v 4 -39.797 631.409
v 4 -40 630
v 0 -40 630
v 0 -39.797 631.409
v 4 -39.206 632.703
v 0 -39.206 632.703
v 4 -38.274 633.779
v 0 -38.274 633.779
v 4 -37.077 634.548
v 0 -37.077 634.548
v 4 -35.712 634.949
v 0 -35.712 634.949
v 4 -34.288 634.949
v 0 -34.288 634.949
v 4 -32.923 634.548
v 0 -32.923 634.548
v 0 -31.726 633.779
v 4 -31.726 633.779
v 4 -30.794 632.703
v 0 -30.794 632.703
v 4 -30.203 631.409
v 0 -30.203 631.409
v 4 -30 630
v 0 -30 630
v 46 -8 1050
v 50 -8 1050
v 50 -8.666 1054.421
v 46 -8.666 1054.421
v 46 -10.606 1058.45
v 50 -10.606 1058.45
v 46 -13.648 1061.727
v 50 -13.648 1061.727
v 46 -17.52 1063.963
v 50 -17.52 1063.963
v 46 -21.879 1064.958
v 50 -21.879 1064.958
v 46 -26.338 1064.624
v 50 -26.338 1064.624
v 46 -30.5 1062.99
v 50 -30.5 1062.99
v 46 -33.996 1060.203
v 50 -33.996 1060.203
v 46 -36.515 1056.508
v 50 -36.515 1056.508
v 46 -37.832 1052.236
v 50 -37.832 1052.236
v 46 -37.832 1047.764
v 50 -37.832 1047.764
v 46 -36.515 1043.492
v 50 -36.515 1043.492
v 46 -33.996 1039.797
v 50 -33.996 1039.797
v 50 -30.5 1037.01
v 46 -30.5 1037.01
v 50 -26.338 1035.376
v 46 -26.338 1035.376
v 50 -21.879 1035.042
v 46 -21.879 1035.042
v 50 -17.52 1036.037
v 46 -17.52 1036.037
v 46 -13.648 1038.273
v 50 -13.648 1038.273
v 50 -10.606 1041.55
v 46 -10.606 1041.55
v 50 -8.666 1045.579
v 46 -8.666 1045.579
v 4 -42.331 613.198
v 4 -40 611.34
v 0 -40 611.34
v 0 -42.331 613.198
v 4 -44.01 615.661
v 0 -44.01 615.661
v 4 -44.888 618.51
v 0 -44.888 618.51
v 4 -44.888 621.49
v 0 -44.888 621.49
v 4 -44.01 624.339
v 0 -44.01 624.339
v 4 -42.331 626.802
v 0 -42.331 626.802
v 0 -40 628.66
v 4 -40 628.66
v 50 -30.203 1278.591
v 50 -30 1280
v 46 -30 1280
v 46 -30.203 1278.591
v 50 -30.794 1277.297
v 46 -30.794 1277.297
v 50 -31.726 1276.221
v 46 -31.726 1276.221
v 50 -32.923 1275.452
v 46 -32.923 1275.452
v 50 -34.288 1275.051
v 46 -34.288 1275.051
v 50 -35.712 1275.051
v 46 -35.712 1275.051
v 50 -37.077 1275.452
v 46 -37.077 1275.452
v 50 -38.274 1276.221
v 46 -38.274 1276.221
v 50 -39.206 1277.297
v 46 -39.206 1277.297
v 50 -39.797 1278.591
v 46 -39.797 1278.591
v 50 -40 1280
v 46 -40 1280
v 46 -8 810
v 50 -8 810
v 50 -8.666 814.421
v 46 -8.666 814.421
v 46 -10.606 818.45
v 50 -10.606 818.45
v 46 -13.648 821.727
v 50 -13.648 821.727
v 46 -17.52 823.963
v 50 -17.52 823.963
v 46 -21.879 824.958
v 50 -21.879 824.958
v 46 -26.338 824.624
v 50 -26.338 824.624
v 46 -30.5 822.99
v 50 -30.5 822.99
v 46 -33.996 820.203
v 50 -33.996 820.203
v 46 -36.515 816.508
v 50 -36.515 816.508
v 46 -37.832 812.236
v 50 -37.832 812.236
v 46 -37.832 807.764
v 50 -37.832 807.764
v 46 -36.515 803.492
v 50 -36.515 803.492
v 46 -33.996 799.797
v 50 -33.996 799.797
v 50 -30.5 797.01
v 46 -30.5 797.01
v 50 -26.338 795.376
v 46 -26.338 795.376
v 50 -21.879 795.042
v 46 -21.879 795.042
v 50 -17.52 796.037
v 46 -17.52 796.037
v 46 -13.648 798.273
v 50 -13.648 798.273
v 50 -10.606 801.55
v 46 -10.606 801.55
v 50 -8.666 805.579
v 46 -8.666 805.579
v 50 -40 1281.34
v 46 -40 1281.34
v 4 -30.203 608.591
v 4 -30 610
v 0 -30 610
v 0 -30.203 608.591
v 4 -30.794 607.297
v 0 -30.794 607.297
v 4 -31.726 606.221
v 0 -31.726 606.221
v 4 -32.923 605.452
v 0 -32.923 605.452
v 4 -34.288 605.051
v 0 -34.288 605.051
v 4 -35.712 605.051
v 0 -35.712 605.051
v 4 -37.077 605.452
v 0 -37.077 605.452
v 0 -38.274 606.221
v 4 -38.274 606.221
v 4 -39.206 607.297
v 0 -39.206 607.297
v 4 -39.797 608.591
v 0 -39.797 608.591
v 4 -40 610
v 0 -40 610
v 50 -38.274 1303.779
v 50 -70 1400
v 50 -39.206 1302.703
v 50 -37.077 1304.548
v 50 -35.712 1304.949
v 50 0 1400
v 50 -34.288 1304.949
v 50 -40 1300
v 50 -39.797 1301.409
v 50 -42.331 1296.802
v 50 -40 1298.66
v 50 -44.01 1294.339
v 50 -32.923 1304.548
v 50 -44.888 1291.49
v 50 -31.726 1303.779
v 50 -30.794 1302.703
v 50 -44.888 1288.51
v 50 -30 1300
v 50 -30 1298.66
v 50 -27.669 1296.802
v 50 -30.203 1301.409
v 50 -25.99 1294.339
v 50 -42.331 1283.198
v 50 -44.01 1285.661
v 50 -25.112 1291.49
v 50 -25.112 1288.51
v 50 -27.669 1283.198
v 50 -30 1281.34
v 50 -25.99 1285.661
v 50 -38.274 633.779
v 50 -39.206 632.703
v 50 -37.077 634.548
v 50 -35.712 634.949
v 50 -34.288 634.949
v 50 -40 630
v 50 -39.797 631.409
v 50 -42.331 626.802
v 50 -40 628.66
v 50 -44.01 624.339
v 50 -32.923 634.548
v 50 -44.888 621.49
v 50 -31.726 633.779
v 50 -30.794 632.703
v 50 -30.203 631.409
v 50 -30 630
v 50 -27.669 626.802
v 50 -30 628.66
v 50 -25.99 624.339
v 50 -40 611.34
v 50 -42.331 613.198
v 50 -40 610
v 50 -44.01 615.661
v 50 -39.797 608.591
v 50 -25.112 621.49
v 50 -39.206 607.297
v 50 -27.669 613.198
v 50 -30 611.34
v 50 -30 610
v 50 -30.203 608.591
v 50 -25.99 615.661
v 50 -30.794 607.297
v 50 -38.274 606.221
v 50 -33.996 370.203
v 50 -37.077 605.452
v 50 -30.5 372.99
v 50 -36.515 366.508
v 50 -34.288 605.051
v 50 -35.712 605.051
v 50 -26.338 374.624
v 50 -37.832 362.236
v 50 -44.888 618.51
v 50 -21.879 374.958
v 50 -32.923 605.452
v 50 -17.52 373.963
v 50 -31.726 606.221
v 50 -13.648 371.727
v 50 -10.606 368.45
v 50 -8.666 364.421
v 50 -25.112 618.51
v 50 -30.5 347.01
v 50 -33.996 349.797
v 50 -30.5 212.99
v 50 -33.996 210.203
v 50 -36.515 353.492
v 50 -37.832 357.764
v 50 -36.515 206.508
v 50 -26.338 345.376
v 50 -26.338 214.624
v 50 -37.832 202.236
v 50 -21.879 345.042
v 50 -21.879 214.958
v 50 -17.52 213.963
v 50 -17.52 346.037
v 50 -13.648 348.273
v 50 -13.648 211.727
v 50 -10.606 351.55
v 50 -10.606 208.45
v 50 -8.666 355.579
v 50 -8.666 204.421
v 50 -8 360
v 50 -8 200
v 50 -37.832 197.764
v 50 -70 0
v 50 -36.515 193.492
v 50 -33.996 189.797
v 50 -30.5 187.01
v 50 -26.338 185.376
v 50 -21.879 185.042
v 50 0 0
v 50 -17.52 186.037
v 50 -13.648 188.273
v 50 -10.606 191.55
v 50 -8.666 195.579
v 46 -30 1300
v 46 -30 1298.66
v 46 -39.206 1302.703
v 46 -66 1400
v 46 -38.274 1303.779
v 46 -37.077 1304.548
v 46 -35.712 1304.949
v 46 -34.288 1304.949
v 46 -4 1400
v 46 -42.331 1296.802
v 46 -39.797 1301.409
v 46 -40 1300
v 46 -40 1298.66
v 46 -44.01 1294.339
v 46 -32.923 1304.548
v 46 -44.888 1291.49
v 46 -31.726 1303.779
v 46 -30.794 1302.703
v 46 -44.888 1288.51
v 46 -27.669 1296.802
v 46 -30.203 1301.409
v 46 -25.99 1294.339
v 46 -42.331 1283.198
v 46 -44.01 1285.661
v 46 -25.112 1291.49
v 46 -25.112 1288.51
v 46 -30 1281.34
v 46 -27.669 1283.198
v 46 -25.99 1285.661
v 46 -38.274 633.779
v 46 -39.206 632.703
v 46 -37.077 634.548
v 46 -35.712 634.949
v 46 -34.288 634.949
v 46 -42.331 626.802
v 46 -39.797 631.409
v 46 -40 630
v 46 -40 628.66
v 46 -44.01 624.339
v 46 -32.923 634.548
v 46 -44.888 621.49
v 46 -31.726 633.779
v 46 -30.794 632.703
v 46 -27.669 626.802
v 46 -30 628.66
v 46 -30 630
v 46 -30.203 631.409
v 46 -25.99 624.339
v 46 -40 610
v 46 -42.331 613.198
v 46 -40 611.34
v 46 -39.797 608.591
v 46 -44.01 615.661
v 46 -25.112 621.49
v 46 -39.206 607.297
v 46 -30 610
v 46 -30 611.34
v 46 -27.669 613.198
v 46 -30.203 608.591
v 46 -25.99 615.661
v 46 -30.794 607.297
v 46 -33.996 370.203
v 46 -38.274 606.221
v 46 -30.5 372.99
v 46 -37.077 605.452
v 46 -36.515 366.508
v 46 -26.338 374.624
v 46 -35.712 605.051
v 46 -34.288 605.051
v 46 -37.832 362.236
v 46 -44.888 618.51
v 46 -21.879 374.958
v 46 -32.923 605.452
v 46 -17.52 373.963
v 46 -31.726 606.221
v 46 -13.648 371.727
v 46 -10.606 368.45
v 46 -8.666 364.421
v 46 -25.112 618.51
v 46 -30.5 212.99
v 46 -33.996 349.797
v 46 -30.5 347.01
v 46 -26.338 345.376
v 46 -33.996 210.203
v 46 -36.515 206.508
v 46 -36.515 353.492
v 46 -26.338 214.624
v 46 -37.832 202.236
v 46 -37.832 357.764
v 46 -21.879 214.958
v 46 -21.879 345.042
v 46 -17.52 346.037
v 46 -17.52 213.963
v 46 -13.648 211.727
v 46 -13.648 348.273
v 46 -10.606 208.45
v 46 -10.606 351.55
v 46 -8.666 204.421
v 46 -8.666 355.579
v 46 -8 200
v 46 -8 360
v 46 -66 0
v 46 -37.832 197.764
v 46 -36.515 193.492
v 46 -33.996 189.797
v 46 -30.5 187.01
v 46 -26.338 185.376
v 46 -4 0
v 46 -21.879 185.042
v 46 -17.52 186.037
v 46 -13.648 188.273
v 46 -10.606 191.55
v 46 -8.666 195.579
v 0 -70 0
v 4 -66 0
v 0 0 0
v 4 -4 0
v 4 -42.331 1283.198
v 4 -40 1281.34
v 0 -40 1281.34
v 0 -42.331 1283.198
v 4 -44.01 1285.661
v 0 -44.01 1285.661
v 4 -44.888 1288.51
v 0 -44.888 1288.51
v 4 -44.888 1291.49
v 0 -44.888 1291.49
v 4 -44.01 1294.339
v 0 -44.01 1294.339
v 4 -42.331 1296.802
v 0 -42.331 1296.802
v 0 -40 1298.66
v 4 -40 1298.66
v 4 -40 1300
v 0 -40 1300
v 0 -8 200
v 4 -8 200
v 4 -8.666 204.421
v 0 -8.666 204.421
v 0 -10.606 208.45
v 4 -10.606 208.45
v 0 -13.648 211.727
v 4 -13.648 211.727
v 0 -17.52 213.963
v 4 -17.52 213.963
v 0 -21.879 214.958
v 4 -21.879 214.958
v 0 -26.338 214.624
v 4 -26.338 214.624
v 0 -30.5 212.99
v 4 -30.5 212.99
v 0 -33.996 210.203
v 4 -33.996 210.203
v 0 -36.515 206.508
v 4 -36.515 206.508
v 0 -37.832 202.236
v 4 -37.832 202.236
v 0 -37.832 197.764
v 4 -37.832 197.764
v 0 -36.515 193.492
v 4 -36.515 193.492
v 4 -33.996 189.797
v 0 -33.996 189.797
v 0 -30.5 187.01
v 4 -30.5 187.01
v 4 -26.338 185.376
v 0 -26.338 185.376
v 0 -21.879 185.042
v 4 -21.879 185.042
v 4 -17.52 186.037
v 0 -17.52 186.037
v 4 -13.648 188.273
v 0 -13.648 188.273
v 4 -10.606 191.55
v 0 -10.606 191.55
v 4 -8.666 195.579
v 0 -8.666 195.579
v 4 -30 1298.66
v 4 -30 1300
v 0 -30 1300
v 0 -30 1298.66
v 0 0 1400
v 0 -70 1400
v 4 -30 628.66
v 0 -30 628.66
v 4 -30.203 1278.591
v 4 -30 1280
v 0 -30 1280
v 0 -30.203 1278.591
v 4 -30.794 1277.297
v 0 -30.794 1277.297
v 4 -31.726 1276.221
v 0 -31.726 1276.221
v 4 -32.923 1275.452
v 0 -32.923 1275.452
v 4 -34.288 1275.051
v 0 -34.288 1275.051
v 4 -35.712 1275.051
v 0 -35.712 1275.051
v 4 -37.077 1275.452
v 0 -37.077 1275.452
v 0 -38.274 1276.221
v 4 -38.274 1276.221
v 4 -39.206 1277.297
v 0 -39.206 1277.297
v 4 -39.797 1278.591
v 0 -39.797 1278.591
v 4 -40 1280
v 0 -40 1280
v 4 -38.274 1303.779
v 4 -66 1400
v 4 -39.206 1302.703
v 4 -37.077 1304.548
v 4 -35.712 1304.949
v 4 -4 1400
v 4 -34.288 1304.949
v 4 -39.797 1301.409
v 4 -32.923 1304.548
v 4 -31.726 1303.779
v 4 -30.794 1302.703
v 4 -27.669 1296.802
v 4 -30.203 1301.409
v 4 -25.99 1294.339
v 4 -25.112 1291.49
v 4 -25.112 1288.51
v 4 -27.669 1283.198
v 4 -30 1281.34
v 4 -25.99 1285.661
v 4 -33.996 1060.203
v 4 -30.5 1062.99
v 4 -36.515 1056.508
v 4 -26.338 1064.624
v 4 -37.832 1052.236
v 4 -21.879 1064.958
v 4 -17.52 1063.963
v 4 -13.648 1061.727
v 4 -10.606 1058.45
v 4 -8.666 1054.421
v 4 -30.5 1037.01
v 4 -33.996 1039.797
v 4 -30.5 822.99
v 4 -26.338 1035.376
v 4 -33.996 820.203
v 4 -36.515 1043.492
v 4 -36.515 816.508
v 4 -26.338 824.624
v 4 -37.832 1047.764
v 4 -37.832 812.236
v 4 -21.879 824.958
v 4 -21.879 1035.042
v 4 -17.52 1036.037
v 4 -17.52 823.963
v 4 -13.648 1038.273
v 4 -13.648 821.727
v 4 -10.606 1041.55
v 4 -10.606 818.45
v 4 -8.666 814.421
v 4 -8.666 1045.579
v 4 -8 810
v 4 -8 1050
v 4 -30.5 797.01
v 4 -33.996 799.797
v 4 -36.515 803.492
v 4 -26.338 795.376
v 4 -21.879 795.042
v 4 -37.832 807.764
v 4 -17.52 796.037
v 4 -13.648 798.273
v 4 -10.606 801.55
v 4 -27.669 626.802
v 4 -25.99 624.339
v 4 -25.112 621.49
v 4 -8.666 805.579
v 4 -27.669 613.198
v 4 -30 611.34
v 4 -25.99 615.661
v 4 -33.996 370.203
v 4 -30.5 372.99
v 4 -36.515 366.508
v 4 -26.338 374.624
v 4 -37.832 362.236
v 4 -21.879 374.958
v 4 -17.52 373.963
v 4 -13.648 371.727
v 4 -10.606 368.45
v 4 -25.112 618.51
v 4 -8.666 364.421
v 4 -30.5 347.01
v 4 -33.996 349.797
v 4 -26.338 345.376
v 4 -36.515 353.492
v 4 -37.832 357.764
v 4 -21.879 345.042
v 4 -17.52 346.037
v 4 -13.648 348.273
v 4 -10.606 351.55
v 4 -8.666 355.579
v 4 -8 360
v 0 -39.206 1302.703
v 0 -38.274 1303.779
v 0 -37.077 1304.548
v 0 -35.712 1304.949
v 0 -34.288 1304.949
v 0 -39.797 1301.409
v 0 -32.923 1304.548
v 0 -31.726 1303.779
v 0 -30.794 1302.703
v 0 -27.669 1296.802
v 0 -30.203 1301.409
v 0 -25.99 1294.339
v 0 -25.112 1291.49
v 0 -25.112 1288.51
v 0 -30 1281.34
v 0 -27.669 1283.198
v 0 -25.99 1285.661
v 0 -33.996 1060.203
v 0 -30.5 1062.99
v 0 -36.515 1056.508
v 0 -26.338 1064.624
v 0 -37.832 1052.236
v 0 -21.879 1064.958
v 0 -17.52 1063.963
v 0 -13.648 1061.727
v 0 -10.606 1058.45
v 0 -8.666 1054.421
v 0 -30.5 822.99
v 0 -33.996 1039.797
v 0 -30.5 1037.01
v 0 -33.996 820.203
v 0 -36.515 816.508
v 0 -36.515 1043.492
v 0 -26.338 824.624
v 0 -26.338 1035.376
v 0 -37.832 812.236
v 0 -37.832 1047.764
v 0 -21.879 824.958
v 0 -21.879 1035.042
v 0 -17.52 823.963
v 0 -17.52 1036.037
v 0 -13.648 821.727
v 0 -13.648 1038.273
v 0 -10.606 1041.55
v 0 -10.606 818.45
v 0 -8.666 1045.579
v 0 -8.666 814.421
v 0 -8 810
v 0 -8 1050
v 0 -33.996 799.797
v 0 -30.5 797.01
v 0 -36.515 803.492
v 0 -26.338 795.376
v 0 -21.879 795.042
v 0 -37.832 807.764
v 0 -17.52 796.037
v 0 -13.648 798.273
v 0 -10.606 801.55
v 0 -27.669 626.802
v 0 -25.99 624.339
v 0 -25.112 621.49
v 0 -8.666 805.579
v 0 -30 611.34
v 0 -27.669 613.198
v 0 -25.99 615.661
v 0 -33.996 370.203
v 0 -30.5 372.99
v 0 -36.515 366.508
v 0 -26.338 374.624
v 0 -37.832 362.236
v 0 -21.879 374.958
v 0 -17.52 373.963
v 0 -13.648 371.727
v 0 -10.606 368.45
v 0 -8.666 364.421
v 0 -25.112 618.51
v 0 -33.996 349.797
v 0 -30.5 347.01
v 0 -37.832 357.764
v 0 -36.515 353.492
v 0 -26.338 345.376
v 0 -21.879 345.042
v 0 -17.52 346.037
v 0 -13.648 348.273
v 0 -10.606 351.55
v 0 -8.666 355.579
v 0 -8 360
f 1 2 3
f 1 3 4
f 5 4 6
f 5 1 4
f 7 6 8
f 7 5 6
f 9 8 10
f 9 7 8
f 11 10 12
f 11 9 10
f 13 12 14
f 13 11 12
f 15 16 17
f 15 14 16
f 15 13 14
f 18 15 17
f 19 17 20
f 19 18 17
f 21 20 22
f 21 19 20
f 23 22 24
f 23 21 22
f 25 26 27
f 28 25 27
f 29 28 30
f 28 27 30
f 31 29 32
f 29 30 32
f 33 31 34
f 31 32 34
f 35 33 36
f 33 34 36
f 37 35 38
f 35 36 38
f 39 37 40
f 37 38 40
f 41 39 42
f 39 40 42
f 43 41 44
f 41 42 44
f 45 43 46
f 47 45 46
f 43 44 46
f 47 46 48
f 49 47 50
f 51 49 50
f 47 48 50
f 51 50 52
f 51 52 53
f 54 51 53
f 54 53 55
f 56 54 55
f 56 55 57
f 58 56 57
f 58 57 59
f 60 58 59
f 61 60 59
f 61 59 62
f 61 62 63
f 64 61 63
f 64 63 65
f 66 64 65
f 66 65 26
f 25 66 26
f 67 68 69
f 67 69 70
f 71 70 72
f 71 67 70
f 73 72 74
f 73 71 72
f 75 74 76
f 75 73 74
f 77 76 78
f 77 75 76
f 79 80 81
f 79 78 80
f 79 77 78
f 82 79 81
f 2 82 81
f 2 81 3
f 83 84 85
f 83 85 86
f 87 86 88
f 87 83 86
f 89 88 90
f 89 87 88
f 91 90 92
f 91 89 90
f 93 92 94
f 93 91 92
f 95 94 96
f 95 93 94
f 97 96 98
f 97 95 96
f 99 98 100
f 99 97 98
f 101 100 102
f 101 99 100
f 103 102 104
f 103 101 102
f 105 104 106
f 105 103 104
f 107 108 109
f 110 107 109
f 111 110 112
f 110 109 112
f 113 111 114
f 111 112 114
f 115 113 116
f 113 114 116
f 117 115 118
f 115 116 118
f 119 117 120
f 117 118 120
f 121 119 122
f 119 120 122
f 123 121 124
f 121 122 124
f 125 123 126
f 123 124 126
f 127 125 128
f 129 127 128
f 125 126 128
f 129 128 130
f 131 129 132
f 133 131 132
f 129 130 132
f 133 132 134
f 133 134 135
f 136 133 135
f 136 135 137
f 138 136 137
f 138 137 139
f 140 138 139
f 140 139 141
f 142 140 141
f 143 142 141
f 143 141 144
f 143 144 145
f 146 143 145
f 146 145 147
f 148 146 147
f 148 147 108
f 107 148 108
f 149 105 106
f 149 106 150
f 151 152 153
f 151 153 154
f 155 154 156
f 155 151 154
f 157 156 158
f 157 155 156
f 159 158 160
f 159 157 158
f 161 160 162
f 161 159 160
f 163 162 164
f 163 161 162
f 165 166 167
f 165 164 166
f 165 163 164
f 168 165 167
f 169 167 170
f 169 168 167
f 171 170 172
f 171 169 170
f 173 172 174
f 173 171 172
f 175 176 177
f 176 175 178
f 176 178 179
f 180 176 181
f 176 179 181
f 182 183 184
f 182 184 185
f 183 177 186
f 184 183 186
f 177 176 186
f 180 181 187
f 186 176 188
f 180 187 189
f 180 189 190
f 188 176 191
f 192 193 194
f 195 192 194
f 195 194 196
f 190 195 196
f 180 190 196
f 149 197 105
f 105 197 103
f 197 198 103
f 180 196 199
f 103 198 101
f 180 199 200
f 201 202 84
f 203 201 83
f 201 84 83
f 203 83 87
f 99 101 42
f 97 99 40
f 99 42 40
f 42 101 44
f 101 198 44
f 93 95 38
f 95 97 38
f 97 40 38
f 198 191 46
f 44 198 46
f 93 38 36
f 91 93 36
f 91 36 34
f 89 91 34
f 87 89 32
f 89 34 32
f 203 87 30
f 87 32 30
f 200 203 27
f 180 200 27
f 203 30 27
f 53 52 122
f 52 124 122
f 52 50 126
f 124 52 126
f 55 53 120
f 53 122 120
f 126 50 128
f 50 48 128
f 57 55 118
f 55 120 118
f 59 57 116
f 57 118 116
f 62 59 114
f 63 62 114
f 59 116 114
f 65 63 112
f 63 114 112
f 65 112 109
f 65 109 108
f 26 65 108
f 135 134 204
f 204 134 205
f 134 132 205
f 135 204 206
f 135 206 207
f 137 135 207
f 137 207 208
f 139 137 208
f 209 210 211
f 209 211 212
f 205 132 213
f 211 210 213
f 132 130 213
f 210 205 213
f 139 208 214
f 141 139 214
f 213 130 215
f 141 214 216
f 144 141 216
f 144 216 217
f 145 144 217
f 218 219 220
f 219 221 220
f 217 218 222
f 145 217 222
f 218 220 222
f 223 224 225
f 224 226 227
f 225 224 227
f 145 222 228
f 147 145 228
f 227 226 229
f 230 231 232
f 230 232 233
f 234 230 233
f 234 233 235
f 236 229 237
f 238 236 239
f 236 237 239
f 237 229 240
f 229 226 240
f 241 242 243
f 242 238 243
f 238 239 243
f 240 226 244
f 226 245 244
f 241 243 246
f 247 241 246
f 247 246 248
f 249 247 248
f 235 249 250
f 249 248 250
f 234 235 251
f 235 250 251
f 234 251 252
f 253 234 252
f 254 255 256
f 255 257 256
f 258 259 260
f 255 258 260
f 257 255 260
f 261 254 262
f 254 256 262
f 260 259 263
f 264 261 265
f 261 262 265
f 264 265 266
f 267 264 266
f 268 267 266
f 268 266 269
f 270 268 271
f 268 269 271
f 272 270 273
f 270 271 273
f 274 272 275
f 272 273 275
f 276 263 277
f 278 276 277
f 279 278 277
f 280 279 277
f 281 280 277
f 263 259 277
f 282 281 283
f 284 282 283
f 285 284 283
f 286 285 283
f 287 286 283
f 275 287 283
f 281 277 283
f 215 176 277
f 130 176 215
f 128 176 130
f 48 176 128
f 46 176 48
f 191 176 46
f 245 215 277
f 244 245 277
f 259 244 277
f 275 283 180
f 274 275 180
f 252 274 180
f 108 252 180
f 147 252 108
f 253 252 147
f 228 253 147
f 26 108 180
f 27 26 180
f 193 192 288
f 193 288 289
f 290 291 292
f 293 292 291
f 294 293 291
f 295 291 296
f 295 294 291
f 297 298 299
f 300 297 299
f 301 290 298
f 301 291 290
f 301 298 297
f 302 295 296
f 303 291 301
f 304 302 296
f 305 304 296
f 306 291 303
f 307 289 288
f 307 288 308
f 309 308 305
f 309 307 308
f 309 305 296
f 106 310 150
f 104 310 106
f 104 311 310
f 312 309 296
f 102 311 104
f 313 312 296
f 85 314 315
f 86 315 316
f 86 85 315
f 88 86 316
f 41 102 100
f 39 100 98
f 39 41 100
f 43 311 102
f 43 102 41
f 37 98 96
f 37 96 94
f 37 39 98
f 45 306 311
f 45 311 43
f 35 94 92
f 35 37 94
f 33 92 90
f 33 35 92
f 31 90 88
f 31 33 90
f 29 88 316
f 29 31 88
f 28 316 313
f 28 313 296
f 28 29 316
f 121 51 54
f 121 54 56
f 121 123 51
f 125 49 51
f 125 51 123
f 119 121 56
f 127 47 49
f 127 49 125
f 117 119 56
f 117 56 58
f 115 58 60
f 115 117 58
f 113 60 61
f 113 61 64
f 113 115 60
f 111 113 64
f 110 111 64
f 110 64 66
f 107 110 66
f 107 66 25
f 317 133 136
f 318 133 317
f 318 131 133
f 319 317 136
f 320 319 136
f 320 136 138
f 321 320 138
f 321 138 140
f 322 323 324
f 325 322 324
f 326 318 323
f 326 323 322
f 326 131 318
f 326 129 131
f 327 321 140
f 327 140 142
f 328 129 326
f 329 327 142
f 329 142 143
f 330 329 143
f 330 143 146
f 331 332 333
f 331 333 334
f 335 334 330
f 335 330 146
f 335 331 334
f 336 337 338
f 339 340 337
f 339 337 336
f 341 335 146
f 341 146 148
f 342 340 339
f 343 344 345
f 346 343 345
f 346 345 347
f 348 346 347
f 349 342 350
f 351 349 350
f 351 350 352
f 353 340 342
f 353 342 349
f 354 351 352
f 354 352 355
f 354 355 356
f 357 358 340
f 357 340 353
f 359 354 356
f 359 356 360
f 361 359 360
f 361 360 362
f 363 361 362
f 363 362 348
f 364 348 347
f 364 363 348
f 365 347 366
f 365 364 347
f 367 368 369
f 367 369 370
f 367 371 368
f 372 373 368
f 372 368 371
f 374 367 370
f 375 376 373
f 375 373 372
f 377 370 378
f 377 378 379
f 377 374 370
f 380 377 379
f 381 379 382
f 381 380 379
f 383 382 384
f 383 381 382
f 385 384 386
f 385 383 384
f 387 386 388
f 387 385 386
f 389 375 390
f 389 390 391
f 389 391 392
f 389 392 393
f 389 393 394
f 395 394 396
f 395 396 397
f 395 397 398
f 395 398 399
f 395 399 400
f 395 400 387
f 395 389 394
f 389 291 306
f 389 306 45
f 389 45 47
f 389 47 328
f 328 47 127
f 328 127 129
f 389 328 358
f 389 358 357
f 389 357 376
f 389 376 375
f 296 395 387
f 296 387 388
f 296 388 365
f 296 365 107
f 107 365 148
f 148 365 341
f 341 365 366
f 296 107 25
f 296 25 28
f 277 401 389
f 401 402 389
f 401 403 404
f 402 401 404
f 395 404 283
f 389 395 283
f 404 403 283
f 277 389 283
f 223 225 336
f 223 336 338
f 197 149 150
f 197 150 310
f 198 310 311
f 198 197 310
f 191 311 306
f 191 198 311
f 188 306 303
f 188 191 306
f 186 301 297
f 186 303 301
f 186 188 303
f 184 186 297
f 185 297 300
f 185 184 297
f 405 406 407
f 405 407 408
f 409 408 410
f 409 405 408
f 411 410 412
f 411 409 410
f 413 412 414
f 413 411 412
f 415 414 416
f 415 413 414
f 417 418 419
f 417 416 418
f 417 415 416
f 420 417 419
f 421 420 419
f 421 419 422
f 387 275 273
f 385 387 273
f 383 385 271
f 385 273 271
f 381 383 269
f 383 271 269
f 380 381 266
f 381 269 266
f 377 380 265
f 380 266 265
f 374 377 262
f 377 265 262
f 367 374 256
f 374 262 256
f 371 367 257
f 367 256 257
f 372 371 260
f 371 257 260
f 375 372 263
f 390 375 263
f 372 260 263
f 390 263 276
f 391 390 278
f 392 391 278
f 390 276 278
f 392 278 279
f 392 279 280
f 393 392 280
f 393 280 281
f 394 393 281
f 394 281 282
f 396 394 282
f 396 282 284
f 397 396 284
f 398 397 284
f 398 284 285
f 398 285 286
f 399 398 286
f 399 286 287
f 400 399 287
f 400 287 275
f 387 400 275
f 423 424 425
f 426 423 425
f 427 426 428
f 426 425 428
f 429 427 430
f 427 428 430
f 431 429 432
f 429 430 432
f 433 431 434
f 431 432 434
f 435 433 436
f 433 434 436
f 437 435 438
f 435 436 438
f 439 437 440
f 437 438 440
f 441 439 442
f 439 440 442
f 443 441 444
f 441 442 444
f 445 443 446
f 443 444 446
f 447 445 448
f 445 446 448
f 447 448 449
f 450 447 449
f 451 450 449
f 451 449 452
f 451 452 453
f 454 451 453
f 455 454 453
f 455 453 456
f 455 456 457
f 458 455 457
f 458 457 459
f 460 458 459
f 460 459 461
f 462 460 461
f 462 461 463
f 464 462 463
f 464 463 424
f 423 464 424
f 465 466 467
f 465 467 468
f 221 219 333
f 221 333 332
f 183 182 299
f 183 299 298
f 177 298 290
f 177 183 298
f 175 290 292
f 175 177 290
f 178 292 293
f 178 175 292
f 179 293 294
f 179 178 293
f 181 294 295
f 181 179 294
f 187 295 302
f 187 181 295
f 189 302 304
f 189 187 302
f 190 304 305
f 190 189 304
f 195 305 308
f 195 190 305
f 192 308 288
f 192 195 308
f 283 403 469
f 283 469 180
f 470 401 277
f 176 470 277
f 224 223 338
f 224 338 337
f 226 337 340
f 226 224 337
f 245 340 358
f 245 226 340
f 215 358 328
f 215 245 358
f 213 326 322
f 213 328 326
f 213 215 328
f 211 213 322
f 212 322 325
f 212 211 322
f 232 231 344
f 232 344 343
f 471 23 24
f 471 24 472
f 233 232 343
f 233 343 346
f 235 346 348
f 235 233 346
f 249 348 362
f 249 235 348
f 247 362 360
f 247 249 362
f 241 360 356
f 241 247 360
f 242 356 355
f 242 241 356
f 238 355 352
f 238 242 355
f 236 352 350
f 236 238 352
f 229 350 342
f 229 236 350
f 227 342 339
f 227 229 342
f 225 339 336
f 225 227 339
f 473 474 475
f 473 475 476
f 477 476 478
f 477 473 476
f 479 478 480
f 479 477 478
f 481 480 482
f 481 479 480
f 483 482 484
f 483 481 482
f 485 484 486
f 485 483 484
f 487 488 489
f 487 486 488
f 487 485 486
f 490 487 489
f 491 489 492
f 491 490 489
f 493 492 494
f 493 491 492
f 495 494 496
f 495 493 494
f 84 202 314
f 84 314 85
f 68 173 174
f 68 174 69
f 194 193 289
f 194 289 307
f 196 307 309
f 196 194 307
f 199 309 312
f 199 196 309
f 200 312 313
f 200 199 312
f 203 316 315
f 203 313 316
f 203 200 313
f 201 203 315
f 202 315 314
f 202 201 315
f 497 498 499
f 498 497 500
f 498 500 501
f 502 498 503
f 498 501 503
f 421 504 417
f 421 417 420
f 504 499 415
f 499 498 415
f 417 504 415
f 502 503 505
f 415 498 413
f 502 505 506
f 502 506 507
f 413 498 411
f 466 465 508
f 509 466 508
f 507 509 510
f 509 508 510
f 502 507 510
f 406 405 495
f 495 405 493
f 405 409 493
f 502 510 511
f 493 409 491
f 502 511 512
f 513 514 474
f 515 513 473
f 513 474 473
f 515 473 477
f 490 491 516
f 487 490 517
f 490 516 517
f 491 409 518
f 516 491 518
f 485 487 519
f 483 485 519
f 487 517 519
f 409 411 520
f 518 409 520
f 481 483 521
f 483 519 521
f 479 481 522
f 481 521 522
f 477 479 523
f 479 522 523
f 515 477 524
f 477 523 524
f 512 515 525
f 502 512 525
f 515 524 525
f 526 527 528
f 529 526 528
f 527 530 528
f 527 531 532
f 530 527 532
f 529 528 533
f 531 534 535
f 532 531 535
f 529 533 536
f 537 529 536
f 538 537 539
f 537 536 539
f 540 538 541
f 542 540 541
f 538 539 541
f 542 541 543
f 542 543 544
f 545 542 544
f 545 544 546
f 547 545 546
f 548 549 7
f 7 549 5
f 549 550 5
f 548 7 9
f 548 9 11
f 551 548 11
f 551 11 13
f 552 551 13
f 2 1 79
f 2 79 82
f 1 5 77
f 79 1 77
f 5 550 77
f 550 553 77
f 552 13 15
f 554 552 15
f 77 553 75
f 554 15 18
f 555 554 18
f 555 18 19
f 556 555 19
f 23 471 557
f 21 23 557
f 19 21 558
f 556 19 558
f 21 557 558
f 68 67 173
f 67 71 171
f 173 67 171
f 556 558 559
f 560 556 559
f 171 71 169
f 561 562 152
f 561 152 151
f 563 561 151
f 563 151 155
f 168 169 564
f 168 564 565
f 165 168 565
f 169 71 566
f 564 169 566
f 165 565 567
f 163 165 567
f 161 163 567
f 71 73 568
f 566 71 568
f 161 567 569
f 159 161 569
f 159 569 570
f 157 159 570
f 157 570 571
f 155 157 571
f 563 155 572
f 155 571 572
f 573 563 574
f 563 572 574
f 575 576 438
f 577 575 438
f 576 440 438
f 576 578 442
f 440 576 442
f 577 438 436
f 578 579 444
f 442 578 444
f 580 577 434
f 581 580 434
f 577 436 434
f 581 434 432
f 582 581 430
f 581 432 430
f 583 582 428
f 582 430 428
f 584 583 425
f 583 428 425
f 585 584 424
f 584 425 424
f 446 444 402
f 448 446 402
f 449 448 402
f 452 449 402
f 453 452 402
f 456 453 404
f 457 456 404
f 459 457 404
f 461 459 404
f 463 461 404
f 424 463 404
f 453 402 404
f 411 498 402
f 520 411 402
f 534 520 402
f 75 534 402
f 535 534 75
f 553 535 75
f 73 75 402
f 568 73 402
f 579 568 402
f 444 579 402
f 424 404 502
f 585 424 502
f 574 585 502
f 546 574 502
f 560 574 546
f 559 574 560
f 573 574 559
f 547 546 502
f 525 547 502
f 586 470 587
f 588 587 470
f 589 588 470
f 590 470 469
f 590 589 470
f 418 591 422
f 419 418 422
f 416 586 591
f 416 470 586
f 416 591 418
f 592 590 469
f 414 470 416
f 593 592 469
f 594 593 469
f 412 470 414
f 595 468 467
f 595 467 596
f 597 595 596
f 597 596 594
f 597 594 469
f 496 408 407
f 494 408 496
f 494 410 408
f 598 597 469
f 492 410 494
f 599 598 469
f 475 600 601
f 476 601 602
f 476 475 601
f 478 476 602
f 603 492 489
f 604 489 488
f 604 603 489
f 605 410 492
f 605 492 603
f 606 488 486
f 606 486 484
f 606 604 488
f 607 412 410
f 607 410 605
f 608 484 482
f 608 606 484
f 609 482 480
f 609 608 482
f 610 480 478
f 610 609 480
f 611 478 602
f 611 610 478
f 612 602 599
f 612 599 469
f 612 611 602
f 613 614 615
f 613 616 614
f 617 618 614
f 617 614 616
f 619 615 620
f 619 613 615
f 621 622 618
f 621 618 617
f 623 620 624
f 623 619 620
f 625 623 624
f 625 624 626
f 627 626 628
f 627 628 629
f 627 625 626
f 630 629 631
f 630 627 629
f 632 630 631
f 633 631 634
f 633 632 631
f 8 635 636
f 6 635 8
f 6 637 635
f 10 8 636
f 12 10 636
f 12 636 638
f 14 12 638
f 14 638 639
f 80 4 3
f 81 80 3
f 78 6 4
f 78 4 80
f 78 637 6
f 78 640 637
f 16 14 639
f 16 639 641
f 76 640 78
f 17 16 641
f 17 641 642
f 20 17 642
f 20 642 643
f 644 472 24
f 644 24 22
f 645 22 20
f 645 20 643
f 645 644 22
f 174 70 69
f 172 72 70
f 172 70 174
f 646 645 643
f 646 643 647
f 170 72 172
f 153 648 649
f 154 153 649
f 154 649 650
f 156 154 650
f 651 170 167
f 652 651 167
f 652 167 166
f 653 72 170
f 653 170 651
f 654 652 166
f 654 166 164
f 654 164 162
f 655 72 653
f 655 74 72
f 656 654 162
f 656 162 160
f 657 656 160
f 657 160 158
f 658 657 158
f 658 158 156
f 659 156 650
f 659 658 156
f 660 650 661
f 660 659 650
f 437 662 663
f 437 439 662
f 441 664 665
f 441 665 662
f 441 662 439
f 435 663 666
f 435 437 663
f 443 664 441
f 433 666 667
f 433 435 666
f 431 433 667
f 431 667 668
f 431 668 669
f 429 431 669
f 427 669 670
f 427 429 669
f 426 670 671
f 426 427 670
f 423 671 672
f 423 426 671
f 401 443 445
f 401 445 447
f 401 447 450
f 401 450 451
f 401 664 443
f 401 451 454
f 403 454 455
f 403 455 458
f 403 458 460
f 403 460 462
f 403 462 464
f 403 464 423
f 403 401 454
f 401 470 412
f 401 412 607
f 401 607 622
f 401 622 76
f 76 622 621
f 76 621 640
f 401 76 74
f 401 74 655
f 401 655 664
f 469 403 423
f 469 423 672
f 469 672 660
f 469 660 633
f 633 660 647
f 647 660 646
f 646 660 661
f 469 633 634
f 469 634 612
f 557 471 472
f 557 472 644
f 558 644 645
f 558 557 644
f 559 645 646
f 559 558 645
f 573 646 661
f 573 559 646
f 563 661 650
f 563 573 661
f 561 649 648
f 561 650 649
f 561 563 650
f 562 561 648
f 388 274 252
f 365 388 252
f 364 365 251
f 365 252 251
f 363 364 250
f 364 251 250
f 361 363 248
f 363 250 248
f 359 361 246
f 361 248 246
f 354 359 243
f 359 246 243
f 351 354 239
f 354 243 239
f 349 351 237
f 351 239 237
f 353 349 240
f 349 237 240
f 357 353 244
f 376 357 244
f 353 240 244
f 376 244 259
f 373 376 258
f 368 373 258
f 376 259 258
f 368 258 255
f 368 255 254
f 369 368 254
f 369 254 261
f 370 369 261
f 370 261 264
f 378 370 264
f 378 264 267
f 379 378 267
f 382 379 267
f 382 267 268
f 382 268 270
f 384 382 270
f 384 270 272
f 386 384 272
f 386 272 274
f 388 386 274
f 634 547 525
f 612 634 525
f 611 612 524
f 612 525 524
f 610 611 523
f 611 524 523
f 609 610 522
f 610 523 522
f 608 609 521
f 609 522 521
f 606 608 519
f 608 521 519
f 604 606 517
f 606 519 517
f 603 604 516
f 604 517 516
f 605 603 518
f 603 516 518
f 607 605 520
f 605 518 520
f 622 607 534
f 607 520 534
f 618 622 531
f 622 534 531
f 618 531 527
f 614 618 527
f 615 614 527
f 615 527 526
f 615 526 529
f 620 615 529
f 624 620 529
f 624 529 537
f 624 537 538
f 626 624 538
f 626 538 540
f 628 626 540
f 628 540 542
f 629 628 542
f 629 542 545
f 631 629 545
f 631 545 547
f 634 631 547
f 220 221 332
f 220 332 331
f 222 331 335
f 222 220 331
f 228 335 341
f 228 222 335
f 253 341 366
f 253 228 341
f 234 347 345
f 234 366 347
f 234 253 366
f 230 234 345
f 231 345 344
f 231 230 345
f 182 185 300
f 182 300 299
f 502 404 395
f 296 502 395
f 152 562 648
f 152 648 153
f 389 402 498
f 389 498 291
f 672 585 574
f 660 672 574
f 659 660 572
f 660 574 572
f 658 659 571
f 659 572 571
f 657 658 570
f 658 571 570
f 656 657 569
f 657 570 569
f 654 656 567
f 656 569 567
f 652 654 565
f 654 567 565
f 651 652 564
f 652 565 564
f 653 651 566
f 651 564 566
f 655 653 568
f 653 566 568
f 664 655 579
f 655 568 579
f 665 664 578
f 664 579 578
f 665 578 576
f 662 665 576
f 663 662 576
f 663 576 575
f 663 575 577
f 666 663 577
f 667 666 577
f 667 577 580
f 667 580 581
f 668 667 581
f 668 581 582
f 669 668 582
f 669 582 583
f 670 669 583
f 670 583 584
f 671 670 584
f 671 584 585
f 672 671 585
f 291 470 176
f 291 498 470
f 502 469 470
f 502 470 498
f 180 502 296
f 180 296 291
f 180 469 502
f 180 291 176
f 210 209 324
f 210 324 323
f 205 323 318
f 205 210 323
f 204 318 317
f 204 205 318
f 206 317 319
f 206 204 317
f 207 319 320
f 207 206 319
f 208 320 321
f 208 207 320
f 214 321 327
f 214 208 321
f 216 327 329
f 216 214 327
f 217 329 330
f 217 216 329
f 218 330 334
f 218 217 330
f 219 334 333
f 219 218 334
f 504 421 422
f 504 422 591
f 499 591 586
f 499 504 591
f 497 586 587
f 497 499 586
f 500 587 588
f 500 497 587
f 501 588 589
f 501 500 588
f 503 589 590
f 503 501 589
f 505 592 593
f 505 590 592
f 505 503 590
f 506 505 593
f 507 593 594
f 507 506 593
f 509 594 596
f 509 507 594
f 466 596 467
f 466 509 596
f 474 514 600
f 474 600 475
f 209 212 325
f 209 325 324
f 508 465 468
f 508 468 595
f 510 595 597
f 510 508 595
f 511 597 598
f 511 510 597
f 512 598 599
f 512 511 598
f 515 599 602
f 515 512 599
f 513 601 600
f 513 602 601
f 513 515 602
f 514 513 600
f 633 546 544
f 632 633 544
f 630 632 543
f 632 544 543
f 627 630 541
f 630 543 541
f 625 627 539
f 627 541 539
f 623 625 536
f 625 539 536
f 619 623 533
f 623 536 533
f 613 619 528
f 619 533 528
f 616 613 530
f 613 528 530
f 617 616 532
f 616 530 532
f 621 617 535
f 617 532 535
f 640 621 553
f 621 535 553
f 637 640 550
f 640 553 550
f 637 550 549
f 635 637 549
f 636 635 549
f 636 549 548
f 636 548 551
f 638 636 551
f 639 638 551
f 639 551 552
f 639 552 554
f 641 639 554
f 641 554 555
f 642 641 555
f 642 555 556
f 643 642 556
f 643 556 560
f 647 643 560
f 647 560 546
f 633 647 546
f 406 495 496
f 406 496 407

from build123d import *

# Parameters (mm, degrees)
SKETCH1_W           = 50
SKETCH1_H           = 70
SKETCH1_W_2         = 42
SKETCH1_H_2         = 62
BOSS_EXTRUDE2_DEPTH = 1400
SKETCH2_R           = 15
CUT_EXTRUDE1_DEPTH  = 1403.640367307


with BuildPart() as part:
    # Sketch1 → Boss-Extrude2 (new body)
    with BuildSketch(Plane.XY):
        with Locations((25, -35)):
            Rectangle(SKETCH1_W, SKETCH1_H)
        with Locations((25, -35)):
            Rectangle(SKETCH1_W_2, SKETCH1_H_2, mode=Mode.SUBTRACT)
    extrude(amount=BOSS_EXTRUDE2_DEPTH)

    # Sketch2 → Cut-Extrude1 (cut, through all)
    with BuildSketch(Plane(origin=(50, 0, 0), x_dir=(0, 0, -1), z_dir=(1, 0, 0))):
        with Locations(Location((-1050, -23, 0), (0, 0, 90))):
            Circle(SKETCH2_R)
        with Locations(Location((-200, -23, 0), (0, 0, 90))):
            Circle(SKETCH2_R)
        with Locations(Location((-810, -23, 0), (0, 0, 90))):
            Circle(SKETCH2_R)
        with Locations(Location((-360, -23, 0), (0, 0, 90))):
            Circle(SKETCH2_R)
        with BuildLine():
            Line((-1281.339745962, -30), (-1280, -30))
            ThreePointArc((-1280, -30), (-1275, -35), (-1280, -40))
            Line((-1280, -40), (-1281.339745962, -40))
            ThreePointArc((-1281.339745962, -40), (-1290, -45), (-1298.660254038, -40))
            Line((-1298.660254038, -40), (-1300, -40))
            ThreePointArc((-1300, -40), (-1305, -35), (-1300, -30))
            Line((-1300, -30), (-1298.660254038, -30))
            ThreePointArc((-1298.660254038, -30), (-1290, -25), (-1281.339745962, -30))
        make_face()
        with BuildLine():
            Line((-611.339745962, -30), (-610, -30))
            ThreePointArc((-610, -30), (-605, -35), (-610, -40))
            Line((-610, -40), (-611.339745962, -40))
            ThreePointArc((-611.339745962, -40), (-620, -45), (-628.660254038, -40))
            Line((-628.660254038, -40), (-630, -40))
            ThreePointArc((-630, -40), (-635, -35), (-630, -30))
            Line((-630, -30), (-628.660254038, -30))
            ThreePointArc((-628.660254038, -30), (-620, -25), (-611.339745962, -30))
        make_face()
    extrude(amount=-CUT_EXTRUDE1_DEPTH, mode=Mode.SUBTRACT)


solid = part.part
